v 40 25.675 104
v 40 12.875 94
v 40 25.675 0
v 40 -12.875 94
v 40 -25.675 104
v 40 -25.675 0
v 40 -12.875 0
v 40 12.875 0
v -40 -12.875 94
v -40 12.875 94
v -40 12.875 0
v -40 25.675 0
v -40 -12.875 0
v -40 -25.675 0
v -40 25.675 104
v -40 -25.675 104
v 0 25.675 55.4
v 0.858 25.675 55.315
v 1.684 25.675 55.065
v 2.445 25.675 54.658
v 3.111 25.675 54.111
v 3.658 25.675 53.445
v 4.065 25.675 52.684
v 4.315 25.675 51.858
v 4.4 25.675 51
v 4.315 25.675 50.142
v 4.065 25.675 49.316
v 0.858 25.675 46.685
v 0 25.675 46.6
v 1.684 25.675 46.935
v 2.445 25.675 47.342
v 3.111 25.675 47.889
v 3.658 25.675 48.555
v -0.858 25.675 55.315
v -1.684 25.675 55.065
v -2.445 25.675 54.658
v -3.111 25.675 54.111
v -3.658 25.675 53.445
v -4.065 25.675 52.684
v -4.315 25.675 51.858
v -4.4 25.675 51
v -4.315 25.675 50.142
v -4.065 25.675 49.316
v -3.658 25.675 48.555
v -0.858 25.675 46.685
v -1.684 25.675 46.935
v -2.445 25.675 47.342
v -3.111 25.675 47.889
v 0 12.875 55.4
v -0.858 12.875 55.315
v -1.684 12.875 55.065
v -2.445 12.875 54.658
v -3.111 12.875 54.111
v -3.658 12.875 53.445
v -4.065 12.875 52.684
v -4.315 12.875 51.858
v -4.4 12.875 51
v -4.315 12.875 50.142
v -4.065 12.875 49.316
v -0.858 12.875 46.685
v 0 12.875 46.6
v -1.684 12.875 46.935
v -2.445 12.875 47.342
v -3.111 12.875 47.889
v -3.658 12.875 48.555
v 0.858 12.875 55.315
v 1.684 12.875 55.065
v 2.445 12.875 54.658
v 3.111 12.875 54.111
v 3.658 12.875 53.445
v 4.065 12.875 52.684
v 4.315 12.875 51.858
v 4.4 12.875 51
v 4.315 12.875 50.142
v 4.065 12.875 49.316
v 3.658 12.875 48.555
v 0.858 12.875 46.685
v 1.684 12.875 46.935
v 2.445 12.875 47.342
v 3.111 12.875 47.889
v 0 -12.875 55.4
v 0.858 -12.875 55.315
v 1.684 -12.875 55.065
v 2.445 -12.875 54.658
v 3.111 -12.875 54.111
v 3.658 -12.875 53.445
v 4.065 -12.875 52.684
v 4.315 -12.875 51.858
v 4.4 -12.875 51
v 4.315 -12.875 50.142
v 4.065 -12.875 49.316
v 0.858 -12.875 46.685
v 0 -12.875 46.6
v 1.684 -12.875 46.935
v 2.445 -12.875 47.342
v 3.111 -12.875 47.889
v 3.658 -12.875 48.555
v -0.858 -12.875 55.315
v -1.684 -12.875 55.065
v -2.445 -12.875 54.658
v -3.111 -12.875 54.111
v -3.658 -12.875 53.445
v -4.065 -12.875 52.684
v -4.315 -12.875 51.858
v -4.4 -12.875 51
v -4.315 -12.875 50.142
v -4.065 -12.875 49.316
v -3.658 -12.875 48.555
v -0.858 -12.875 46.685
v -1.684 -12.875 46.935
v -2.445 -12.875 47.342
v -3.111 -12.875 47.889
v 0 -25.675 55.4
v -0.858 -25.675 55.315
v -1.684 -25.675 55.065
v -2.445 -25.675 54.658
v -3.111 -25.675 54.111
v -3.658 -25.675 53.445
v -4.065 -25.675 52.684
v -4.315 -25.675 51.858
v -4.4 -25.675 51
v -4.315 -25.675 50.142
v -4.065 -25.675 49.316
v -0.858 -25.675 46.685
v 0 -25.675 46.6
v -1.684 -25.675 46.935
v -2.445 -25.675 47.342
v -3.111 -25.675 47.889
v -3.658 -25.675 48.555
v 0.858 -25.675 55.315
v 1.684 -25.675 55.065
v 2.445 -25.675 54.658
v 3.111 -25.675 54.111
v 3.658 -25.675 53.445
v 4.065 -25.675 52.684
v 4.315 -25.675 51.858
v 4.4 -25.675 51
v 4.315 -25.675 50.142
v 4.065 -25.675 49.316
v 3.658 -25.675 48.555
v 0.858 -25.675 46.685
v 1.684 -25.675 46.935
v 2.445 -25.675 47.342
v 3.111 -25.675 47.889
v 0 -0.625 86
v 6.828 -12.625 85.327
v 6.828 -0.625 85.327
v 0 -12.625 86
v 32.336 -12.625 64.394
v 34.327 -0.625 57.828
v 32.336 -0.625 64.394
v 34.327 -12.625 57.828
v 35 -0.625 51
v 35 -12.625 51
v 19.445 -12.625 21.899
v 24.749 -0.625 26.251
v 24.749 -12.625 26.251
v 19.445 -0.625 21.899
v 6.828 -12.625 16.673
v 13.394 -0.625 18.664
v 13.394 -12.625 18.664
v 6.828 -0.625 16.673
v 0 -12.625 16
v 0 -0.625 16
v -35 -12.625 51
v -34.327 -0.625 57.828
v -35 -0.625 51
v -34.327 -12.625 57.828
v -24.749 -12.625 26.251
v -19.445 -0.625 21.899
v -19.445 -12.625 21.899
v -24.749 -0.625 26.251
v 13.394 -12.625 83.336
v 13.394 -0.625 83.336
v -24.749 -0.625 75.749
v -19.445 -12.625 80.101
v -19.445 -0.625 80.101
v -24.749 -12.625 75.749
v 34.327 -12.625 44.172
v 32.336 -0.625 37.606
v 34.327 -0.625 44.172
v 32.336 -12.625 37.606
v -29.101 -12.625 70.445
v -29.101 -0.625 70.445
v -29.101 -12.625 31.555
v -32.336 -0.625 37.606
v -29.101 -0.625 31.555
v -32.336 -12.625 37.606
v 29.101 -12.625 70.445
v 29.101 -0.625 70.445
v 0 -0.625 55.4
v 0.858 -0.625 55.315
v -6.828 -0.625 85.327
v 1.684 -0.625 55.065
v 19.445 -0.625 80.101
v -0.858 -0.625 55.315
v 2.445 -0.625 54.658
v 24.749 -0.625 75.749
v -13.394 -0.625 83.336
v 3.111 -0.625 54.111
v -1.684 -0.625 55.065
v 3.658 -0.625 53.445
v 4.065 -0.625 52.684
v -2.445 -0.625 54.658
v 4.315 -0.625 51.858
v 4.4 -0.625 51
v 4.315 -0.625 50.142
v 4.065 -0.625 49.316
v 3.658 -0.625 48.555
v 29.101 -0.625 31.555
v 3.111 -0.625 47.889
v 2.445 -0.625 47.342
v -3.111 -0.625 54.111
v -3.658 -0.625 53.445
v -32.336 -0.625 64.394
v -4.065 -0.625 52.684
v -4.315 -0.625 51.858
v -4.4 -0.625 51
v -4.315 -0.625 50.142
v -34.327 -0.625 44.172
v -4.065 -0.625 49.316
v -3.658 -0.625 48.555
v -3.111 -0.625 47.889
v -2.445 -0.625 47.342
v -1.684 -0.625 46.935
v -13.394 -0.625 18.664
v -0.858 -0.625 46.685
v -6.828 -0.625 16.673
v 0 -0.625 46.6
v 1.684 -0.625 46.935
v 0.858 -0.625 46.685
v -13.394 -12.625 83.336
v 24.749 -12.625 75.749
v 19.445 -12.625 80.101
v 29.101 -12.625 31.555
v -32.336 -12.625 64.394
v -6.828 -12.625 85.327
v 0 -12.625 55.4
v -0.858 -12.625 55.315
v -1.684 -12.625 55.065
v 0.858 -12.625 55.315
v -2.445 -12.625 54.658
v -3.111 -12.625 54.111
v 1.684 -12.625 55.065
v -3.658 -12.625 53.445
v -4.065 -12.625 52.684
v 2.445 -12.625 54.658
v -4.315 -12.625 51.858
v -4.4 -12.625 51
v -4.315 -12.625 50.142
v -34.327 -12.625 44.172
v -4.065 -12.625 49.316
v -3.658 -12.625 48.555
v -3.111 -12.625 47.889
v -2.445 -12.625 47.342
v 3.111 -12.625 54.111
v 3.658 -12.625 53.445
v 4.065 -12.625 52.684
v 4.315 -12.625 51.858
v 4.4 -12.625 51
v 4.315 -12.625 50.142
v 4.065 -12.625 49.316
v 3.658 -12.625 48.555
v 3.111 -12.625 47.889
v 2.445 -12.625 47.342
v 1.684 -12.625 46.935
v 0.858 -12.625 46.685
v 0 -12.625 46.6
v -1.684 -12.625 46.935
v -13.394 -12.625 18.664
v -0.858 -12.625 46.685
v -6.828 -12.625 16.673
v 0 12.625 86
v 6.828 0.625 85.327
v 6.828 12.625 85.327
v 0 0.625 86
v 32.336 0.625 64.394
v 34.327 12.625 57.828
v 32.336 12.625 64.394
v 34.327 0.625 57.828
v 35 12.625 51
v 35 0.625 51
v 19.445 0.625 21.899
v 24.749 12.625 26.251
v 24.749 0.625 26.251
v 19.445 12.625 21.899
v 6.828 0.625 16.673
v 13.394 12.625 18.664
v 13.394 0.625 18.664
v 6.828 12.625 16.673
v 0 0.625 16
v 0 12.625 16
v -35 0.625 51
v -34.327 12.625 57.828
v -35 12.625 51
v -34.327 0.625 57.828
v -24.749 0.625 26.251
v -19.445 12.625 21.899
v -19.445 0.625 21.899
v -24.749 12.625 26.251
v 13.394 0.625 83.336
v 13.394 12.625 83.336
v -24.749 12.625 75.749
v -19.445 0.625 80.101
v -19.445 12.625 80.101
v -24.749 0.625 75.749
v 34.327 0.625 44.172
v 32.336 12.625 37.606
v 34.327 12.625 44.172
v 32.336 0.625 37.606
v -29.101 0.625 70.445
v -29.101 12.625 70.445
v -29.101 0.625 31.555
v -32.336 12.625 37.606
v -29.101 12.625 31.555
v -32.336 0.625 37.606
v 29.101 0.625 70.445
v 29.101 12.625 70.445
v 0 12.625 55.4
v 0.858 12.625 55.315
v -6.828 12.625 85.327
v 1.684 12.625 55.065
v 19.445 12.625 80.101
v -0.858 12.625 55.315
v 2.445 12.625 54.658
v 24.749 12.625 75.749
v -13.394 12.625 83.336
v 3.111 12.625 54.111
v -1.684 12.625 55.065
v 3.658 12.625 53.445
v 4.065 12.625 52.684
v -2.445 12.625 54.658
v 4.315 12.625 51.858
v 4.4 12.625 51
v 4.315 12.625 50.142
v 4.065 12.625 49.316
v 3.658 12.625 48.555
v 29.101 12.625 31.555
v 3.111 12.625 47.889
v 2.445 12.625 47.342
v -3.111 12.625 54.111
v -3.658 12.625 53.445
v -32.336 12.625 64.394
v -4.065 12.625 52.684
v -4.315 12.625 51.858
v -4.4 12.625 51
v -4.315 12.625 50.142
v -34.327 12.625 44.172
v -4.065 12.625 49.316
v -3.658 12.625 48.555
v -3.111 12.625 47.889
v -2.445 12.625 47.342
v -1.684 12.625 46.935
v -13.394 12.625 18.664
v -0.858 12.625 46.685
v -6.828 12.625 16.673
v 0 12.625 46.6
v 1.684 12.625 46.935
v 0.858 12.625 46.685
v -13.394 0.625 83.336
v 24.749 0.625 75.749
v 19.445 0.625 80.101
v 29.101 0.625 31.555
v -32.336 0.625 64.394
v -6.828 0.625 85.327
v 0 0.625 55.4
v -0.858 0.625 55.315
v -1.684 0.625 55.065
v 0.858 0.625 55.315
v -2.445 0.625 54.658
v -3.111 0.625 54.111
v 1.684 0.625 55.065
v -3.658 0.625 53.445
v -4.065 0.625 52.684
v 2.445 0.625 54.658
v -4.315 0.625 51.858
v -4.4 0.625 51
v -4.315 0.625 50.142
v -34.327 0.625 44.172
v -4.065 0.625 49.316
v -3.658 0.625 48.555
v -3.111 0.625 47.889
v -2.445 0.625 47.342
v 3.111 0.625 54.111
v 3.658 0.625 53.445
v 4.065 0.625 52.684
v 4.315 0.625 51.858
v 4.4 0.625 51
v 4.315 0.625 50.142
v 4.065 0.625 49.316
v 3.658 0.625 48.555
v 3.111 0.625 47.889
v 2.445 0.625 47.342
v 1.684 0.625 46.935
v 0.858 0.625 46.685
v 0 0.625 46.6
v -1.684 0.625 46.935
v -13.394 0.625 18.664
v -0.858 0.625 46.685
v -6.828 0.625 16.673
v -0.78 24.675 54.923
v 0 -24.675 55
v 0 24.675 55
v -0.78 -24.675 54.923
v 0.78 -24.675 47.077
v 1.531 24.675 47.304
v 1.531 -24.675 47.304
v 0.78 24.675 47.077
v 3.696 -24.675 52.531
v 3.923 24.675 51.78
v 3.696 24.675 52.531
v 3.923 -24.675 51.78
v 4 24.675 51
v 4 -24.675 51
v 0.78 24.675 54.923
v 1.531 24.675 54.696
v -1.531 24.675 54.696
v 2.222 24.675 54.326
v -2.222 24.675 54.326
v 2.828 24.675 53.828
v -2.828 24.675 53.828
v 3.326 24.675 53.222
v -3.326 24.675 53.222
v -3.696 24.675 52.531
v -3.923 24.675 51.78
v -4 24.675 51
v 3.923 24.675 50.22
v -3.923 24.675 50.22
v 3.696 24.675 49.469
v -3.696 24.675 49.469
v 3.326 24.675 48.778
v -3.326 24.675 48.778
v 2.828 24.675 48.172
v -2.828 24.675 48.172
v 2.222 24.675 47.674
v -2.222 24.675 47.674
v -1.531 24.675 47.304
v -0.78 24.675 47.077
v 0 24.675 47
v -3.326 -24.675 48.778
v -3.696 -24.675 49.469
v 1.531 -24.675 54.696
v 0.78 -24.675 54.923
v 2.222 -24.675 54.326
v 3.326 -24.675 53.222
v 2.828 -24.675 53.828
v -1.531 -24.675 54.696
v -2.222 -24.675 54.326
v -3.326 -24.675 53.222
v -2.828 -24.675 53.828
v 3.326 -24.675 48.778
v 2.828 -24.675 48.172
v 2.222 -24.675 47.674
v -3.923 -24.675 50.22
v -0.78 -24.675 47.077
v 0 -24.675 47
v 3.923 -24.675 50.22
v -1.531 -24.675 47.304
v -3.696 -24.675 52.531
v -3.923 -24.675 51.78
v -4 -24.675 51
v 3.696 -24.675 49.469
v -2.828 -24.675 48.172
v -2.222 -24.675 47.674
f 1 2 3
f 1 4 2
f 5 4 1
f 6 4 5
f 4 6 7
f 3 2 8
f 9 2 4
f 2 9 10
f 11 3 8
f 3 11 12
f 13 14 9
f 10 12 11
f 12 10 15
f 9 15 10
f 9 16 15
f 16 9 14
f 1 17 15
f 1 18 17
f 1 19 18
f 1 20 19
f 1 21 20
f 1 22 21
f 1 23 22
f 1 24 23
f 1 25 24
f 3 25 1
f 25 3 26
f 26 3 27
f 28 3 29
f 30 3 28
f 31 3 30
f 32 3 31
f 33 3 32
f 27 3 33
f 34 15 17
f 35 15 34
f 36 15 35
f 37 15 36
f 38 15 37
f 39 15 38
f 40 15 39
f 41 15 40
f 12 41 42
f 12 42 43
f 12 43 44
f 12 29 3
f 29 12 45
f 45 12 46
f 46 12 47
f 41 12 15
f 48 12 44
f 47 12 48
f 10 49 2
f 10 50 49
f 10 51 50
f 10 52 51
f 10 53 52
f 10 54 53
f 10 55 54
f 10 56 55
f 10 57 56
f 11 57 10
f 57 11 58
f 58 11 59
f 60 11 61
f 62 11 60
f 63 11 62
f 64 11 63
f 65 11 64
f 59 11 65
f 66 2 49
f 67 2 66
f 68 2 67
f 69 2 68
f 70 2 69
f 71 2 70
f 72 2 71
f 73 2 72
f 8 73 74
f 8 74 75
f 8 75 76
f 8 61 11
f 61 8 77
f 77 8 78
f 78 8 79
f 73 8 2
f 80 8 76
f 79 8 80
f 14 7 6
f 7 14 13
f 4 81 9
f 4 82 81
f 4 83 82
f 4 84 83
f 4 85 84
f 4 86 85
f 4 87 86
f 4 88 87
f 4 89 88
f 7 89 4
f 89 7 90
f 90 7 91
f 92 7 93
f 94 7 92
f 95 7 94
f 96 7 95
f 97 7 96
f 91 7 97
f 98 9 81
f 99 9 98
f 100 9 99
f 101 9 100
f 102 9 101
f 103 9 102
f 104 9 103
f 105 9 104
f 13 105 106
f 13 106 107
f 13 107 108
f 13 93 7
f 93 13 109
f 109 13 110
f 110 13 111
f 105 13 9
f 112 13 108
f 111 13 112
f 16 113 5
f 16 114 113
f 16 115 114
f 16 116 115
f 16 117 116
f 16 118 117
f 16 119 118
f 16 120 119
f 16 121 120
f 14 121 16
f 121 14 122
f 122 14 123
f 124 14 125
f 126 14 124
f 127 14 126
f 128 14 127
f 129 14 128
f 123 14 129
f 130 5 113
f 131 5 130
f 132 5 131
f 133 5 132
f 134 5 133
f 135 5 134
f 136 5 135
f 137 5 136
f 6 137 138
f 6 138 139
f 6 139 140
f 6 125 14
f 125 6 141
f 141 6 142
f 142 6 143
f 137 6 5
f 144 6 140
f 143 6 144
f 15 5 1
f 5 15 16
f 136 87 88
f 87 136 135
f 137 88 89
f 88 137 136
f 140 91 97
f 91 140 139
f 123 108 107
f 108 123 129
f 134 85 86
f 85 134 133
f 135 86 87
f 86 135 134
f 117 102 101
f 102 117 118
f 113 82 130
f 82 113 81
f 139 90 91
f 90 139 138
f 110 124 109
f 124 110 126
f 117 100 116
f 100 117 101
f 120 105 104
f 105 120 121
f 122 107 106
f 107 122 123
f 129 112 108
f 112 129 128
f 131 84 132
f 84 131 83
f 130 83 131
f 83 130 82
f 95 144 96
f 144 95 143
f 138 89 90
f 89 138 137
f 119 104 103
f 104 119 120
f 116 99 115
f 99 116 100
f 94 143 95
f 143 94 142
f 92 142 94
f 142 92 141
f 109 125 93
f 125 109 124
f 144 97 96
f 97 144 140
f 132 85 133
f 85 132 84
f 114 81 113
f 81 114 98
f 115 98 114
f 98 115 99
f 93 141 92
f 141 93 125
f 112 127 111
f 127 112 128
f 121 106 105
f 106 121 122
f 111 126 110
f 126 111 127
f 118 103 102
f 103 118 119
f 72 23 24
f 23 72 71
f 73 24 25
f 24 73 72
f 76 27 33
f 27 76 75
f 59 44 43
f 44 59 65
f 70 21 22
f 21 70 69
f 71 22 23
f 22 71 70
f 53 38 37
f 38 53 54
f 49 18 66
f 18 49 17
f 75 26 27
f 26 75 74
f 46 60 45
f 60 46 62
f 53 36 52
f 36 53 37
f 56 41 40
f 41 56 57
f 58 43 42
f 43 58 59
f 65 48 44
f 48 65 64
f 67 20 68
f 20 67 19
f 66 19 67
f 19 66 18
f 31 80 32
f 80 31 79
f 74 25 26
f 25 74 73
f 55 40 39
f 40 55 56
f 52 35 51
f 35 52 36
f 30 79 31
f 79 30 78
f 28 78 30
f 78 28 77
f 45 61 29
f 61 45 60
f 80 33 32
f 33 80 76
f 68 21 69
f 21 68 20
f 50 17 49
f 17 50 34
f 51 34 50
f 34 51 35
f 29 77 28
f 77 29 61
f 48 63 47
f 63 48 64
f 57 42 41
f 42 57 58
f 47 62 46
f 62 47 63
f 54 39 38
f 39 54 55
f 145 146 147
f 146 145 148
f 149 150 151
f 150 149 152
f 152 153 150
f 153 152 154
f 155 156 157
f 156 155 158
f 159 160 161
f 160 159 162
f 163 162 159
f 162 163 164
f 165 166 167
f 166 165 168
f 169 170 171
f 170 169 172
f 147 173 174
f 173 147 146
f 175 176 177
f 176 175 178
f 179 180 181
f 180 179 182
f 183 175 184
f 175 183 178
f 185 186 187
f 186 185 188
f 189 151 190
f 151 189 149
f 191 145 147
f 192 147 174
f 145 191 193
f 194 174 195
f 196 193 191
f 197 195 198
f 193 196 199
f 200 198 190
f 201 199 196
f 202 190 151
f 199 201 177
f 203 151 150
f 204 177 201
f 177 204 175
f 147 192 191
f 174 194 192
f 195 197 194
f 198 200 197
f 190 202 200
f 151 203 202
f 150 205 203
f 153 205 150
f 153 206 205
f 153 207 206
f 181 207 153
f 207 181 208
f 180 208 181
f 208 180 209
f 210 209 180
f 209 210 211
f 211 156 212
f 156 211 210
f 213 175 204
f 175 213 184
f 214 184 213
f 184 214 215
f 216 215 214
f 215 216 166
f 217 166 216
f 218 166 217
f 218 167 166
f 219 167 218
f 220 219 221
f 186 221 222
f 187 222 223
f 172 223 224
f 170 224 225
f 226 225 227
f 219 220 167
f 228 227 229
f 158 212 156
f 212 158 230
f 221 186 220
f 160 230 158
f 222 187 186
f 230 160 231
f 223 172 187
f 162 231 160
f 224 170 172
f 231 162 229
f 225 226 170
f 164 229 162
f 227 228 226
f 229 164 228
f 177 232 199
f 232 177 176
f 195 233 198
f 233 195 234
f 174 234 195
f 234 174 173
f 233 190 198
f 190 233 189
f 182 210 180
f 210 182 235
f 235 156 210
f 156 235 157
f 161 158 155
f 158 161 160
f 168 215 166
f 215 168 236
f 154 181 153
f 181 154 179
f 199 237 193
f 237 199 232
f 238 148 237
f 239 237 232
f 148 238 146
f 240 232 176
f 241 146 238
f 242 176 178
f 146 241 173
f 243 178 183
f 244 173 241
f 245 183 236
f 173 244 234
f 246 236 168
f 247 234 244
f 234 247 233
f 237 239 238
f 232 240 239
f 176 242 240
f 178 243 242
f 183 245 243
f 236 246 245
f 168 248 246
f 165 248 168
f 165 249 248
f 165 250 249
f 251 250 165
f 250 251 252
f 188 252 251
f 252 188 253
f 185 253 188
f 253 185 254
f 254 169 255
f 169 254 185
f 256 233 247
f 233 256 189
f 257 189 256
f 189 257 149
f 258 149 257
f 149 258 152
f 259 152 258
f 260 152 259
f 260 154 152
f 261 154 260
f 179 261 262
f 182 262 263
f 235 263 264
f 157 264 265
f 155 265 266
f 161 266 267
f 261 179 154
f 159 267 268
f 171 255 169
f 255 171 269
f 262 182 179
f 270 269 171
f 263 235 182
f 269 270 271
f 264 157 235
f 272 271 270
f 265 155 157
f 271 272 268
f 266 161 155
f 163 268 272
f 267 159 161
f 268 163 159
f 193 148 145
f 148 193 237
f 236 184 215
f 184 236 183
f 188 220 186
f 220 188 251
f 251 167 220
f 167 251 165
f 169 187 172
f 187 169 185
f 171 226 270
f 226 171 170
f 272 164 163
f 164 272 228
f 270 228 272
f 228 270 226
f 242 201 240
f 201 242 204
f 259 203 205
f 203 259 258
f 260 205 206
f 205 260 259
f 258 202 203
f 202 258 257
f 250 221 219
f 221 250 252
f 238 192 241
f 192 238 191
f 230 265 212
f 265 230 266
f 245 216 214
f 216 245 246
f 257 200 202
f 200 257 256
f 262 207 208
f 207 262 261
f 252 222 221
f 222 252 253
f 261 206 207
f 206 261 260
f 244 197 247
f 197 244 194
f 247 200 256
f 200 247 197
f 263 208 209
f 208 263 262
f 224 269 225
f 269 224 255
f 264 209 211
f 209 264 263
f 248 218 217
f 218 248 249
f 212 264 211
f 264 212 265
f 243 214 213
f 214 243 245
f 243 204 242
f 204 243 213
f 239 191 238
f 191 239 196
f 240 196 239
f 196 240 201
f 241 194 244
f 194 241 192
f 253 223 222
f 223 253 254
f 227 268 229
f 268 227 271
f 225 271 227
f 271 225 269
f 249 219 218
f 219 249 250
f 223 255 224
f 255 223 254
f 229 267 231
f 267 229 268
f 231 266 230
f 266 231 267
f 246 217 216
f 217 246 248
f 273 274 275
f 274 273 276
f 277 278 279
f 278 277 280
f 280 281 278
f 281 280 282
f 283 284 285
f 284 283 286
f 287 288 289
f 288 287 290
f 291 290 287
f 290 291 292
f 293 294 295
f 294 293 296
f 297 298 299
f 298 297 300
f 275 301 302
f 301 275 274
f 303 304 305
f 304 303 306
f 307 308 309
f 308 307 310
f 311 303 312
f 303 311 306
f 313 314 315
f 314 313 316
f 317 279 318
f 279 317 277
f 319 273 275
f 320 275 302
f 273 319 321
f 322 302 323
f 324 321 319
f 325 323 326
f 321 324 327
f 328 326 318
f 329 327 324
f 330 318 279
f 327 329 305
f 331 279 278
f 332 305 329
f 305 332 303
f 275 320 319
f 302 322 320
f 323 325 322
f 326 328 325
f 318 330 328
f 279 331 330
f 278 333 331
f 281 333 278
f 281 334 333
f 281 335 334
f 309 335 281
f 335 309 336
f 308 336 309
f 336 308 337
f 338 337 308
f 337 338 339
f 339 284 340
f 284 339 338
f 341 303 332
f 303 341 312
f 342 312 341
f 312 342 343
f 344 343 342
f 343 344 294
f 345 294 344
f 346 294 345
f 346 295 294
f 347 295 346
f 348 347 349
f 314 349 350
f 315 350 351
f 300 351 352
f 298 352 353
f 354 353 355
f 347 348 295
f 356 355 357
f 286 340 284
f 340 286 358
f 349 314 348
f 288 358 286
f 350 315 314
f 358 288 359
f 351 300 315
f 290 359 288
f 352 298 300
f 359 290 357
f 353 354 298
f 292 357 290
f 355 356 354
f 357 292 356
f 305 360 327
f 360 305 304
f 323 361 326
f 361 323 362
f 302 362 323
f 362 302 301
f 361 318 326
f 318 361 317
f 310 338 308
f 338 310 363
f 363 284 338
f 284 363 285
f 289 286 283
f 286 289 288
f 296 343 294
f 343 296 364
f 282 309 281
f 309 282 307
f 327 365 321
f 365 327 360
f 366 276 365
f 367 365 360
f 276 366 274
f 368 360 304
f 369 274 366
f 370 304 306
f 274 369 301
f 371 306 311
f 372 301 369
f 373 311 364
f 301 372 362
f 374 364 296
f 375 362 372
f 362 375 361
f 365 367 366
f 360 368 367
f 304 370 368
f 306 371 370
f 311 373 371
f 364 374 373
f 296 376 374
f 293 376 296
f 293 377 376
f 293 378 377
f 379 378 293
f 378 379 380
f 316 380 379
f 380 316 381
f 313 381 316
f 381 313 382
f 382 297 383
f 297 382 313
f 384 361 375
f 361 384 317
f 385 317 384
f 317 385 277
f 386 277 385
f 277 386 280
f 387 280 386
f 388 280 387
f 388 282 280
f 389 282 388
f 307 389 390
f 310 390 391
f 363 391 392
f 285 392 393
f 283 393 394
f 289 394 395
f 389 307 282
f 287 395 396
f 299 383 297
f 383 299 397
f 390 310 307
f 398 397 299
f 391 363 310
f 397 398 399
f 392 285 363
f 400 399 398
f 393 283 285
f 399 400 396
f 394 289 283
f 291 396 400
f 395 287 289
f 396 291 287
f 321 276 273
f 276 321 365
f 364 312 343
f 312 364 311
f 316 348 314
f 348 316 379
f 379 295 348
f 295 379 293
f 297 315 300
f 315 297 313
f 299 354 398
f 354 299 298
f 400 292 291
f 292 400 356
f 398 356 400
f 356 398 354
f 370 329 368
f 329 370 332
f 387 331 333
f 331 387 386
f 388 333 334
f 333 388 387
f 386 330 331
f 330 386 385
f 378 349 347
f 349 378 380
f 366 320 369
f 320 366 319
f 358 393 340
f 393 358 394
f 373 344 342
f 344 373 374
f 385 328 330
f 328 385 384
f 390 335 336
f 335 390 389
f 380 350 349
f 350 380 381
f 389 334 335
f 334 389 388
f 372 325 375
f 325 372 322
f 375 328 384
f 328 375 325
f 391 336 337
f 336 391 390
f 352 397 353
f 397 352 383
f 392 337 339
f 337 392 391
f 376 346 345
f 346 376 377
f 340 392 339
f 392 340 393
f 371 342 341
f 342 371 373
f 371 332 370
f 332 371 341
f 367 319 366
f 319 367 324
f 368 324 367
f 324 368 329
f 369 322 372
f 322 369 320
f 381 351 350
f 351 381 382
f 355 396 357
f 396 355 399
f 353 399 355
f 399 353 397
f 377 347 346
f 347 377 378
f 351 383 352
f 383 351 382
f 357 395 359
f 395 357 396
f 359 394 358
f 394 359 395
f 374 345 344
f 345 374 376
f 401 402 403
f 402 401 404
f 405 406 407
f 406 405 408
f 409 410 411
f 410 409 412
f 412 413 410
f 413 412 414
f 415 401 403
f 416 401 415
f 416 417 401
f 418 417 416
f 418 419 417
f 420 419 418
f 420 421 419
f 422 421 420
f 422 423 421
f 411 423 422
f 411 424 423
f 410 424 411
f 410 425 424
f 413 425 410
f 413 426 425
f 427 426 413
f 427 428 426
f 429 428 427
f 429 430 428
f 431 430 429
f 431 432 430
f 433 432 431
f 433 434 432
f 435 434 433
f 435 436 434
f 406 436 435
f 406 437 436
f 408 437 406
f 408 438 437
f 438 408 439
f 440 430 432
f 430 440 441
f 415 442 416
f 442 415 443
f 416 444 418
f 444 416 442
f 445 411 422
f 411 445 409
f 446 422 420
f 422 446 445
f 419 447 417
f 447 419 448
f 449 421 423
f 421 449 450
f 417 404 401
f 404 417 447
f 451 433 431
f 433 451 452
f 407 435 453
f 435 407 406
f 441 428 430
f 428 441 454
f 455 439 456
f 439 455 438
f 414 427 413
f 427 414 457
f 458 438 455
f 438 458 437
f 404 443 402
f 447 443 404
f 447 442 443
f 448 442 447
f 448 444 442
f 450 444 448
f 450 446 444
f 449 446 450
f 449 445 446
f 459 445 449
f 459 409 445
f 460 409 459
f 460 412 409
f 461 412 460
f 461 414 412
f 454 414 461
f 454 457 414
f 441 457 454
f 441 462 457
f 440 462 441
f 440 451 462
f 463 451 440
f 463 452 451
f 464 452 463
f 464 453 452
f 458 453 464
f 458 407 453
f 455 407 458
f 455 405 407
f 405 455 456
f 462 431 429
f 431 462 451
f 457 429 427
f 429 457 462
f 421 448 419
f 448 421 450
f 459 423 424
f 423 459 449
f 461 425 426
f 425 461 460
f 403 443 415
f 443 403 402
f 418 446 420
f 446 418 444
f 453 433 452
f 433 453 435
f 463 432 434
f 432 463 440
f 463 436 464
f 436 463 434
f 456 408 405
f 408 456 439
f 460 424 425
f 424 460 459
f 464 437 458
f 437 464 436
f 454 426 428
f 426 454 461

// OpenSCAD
$fn = 32;

// ------------------------------------------------------------------------
// Trolley wheel set: wheels d70, fork 94 mm tall
// Every part is its own module, assembly() places every instance.
// ------------------------------------------------------------------------

// --- part 1 ---
module trolley_fork() {
  difference() {
    union() {
      translate([-40, 12.875, 0]) cube([80, 12.8, 94]);
      translate([-40, -25.675, 0]) cube([80, 12.8, 94]);
      translate([-40, -25.675, 94]) cube([80, 51.35, 10]);
    }
    translate([0, -19.275, 51]) rotate([90, 0, 0]) cylinder(h = 14.8, d = 8.8, center = true);
    translate([0, 19.275, 51]) rotate([90, 0, 0]) cylinder(h = 14.8, d = 8.8, center = true);
  }
}

// --- part 2 ---
module trolley_wheel() {
  difference() {
      translate([0, 0, 0]) cylinder(h = 12, d = 70);
      translate([0, 0, -1]) cylinder(h = 14, d = 8.8);
    }
}

// --- part 3 ---
module trolley_axle() {
  translate([0, 0, -24.675]) cylinder(h = 49.35, d = 8);
}

// --- assembly ---
module assembly() {
  color([0.80, 0.24, 0.20]) translate([0, 0, 0]) rotate([0, 0, 0]) trolley_fork();
  color([0.20, 0.45, 0.75]) translate([0, -0.625, 51]) rotate([90, 0, 0]) trolley_wheel();
  color([0.25, 0.62, 0.32]) translate([0, 12.625, 51]) rotate([90, 0, 0]) trolley_wheel();
  color([0.92, 0.70, 0.18]) translate([0, 0, 51]) rotate([90, 0, 0]) trolley_axle();
}

assembly();
